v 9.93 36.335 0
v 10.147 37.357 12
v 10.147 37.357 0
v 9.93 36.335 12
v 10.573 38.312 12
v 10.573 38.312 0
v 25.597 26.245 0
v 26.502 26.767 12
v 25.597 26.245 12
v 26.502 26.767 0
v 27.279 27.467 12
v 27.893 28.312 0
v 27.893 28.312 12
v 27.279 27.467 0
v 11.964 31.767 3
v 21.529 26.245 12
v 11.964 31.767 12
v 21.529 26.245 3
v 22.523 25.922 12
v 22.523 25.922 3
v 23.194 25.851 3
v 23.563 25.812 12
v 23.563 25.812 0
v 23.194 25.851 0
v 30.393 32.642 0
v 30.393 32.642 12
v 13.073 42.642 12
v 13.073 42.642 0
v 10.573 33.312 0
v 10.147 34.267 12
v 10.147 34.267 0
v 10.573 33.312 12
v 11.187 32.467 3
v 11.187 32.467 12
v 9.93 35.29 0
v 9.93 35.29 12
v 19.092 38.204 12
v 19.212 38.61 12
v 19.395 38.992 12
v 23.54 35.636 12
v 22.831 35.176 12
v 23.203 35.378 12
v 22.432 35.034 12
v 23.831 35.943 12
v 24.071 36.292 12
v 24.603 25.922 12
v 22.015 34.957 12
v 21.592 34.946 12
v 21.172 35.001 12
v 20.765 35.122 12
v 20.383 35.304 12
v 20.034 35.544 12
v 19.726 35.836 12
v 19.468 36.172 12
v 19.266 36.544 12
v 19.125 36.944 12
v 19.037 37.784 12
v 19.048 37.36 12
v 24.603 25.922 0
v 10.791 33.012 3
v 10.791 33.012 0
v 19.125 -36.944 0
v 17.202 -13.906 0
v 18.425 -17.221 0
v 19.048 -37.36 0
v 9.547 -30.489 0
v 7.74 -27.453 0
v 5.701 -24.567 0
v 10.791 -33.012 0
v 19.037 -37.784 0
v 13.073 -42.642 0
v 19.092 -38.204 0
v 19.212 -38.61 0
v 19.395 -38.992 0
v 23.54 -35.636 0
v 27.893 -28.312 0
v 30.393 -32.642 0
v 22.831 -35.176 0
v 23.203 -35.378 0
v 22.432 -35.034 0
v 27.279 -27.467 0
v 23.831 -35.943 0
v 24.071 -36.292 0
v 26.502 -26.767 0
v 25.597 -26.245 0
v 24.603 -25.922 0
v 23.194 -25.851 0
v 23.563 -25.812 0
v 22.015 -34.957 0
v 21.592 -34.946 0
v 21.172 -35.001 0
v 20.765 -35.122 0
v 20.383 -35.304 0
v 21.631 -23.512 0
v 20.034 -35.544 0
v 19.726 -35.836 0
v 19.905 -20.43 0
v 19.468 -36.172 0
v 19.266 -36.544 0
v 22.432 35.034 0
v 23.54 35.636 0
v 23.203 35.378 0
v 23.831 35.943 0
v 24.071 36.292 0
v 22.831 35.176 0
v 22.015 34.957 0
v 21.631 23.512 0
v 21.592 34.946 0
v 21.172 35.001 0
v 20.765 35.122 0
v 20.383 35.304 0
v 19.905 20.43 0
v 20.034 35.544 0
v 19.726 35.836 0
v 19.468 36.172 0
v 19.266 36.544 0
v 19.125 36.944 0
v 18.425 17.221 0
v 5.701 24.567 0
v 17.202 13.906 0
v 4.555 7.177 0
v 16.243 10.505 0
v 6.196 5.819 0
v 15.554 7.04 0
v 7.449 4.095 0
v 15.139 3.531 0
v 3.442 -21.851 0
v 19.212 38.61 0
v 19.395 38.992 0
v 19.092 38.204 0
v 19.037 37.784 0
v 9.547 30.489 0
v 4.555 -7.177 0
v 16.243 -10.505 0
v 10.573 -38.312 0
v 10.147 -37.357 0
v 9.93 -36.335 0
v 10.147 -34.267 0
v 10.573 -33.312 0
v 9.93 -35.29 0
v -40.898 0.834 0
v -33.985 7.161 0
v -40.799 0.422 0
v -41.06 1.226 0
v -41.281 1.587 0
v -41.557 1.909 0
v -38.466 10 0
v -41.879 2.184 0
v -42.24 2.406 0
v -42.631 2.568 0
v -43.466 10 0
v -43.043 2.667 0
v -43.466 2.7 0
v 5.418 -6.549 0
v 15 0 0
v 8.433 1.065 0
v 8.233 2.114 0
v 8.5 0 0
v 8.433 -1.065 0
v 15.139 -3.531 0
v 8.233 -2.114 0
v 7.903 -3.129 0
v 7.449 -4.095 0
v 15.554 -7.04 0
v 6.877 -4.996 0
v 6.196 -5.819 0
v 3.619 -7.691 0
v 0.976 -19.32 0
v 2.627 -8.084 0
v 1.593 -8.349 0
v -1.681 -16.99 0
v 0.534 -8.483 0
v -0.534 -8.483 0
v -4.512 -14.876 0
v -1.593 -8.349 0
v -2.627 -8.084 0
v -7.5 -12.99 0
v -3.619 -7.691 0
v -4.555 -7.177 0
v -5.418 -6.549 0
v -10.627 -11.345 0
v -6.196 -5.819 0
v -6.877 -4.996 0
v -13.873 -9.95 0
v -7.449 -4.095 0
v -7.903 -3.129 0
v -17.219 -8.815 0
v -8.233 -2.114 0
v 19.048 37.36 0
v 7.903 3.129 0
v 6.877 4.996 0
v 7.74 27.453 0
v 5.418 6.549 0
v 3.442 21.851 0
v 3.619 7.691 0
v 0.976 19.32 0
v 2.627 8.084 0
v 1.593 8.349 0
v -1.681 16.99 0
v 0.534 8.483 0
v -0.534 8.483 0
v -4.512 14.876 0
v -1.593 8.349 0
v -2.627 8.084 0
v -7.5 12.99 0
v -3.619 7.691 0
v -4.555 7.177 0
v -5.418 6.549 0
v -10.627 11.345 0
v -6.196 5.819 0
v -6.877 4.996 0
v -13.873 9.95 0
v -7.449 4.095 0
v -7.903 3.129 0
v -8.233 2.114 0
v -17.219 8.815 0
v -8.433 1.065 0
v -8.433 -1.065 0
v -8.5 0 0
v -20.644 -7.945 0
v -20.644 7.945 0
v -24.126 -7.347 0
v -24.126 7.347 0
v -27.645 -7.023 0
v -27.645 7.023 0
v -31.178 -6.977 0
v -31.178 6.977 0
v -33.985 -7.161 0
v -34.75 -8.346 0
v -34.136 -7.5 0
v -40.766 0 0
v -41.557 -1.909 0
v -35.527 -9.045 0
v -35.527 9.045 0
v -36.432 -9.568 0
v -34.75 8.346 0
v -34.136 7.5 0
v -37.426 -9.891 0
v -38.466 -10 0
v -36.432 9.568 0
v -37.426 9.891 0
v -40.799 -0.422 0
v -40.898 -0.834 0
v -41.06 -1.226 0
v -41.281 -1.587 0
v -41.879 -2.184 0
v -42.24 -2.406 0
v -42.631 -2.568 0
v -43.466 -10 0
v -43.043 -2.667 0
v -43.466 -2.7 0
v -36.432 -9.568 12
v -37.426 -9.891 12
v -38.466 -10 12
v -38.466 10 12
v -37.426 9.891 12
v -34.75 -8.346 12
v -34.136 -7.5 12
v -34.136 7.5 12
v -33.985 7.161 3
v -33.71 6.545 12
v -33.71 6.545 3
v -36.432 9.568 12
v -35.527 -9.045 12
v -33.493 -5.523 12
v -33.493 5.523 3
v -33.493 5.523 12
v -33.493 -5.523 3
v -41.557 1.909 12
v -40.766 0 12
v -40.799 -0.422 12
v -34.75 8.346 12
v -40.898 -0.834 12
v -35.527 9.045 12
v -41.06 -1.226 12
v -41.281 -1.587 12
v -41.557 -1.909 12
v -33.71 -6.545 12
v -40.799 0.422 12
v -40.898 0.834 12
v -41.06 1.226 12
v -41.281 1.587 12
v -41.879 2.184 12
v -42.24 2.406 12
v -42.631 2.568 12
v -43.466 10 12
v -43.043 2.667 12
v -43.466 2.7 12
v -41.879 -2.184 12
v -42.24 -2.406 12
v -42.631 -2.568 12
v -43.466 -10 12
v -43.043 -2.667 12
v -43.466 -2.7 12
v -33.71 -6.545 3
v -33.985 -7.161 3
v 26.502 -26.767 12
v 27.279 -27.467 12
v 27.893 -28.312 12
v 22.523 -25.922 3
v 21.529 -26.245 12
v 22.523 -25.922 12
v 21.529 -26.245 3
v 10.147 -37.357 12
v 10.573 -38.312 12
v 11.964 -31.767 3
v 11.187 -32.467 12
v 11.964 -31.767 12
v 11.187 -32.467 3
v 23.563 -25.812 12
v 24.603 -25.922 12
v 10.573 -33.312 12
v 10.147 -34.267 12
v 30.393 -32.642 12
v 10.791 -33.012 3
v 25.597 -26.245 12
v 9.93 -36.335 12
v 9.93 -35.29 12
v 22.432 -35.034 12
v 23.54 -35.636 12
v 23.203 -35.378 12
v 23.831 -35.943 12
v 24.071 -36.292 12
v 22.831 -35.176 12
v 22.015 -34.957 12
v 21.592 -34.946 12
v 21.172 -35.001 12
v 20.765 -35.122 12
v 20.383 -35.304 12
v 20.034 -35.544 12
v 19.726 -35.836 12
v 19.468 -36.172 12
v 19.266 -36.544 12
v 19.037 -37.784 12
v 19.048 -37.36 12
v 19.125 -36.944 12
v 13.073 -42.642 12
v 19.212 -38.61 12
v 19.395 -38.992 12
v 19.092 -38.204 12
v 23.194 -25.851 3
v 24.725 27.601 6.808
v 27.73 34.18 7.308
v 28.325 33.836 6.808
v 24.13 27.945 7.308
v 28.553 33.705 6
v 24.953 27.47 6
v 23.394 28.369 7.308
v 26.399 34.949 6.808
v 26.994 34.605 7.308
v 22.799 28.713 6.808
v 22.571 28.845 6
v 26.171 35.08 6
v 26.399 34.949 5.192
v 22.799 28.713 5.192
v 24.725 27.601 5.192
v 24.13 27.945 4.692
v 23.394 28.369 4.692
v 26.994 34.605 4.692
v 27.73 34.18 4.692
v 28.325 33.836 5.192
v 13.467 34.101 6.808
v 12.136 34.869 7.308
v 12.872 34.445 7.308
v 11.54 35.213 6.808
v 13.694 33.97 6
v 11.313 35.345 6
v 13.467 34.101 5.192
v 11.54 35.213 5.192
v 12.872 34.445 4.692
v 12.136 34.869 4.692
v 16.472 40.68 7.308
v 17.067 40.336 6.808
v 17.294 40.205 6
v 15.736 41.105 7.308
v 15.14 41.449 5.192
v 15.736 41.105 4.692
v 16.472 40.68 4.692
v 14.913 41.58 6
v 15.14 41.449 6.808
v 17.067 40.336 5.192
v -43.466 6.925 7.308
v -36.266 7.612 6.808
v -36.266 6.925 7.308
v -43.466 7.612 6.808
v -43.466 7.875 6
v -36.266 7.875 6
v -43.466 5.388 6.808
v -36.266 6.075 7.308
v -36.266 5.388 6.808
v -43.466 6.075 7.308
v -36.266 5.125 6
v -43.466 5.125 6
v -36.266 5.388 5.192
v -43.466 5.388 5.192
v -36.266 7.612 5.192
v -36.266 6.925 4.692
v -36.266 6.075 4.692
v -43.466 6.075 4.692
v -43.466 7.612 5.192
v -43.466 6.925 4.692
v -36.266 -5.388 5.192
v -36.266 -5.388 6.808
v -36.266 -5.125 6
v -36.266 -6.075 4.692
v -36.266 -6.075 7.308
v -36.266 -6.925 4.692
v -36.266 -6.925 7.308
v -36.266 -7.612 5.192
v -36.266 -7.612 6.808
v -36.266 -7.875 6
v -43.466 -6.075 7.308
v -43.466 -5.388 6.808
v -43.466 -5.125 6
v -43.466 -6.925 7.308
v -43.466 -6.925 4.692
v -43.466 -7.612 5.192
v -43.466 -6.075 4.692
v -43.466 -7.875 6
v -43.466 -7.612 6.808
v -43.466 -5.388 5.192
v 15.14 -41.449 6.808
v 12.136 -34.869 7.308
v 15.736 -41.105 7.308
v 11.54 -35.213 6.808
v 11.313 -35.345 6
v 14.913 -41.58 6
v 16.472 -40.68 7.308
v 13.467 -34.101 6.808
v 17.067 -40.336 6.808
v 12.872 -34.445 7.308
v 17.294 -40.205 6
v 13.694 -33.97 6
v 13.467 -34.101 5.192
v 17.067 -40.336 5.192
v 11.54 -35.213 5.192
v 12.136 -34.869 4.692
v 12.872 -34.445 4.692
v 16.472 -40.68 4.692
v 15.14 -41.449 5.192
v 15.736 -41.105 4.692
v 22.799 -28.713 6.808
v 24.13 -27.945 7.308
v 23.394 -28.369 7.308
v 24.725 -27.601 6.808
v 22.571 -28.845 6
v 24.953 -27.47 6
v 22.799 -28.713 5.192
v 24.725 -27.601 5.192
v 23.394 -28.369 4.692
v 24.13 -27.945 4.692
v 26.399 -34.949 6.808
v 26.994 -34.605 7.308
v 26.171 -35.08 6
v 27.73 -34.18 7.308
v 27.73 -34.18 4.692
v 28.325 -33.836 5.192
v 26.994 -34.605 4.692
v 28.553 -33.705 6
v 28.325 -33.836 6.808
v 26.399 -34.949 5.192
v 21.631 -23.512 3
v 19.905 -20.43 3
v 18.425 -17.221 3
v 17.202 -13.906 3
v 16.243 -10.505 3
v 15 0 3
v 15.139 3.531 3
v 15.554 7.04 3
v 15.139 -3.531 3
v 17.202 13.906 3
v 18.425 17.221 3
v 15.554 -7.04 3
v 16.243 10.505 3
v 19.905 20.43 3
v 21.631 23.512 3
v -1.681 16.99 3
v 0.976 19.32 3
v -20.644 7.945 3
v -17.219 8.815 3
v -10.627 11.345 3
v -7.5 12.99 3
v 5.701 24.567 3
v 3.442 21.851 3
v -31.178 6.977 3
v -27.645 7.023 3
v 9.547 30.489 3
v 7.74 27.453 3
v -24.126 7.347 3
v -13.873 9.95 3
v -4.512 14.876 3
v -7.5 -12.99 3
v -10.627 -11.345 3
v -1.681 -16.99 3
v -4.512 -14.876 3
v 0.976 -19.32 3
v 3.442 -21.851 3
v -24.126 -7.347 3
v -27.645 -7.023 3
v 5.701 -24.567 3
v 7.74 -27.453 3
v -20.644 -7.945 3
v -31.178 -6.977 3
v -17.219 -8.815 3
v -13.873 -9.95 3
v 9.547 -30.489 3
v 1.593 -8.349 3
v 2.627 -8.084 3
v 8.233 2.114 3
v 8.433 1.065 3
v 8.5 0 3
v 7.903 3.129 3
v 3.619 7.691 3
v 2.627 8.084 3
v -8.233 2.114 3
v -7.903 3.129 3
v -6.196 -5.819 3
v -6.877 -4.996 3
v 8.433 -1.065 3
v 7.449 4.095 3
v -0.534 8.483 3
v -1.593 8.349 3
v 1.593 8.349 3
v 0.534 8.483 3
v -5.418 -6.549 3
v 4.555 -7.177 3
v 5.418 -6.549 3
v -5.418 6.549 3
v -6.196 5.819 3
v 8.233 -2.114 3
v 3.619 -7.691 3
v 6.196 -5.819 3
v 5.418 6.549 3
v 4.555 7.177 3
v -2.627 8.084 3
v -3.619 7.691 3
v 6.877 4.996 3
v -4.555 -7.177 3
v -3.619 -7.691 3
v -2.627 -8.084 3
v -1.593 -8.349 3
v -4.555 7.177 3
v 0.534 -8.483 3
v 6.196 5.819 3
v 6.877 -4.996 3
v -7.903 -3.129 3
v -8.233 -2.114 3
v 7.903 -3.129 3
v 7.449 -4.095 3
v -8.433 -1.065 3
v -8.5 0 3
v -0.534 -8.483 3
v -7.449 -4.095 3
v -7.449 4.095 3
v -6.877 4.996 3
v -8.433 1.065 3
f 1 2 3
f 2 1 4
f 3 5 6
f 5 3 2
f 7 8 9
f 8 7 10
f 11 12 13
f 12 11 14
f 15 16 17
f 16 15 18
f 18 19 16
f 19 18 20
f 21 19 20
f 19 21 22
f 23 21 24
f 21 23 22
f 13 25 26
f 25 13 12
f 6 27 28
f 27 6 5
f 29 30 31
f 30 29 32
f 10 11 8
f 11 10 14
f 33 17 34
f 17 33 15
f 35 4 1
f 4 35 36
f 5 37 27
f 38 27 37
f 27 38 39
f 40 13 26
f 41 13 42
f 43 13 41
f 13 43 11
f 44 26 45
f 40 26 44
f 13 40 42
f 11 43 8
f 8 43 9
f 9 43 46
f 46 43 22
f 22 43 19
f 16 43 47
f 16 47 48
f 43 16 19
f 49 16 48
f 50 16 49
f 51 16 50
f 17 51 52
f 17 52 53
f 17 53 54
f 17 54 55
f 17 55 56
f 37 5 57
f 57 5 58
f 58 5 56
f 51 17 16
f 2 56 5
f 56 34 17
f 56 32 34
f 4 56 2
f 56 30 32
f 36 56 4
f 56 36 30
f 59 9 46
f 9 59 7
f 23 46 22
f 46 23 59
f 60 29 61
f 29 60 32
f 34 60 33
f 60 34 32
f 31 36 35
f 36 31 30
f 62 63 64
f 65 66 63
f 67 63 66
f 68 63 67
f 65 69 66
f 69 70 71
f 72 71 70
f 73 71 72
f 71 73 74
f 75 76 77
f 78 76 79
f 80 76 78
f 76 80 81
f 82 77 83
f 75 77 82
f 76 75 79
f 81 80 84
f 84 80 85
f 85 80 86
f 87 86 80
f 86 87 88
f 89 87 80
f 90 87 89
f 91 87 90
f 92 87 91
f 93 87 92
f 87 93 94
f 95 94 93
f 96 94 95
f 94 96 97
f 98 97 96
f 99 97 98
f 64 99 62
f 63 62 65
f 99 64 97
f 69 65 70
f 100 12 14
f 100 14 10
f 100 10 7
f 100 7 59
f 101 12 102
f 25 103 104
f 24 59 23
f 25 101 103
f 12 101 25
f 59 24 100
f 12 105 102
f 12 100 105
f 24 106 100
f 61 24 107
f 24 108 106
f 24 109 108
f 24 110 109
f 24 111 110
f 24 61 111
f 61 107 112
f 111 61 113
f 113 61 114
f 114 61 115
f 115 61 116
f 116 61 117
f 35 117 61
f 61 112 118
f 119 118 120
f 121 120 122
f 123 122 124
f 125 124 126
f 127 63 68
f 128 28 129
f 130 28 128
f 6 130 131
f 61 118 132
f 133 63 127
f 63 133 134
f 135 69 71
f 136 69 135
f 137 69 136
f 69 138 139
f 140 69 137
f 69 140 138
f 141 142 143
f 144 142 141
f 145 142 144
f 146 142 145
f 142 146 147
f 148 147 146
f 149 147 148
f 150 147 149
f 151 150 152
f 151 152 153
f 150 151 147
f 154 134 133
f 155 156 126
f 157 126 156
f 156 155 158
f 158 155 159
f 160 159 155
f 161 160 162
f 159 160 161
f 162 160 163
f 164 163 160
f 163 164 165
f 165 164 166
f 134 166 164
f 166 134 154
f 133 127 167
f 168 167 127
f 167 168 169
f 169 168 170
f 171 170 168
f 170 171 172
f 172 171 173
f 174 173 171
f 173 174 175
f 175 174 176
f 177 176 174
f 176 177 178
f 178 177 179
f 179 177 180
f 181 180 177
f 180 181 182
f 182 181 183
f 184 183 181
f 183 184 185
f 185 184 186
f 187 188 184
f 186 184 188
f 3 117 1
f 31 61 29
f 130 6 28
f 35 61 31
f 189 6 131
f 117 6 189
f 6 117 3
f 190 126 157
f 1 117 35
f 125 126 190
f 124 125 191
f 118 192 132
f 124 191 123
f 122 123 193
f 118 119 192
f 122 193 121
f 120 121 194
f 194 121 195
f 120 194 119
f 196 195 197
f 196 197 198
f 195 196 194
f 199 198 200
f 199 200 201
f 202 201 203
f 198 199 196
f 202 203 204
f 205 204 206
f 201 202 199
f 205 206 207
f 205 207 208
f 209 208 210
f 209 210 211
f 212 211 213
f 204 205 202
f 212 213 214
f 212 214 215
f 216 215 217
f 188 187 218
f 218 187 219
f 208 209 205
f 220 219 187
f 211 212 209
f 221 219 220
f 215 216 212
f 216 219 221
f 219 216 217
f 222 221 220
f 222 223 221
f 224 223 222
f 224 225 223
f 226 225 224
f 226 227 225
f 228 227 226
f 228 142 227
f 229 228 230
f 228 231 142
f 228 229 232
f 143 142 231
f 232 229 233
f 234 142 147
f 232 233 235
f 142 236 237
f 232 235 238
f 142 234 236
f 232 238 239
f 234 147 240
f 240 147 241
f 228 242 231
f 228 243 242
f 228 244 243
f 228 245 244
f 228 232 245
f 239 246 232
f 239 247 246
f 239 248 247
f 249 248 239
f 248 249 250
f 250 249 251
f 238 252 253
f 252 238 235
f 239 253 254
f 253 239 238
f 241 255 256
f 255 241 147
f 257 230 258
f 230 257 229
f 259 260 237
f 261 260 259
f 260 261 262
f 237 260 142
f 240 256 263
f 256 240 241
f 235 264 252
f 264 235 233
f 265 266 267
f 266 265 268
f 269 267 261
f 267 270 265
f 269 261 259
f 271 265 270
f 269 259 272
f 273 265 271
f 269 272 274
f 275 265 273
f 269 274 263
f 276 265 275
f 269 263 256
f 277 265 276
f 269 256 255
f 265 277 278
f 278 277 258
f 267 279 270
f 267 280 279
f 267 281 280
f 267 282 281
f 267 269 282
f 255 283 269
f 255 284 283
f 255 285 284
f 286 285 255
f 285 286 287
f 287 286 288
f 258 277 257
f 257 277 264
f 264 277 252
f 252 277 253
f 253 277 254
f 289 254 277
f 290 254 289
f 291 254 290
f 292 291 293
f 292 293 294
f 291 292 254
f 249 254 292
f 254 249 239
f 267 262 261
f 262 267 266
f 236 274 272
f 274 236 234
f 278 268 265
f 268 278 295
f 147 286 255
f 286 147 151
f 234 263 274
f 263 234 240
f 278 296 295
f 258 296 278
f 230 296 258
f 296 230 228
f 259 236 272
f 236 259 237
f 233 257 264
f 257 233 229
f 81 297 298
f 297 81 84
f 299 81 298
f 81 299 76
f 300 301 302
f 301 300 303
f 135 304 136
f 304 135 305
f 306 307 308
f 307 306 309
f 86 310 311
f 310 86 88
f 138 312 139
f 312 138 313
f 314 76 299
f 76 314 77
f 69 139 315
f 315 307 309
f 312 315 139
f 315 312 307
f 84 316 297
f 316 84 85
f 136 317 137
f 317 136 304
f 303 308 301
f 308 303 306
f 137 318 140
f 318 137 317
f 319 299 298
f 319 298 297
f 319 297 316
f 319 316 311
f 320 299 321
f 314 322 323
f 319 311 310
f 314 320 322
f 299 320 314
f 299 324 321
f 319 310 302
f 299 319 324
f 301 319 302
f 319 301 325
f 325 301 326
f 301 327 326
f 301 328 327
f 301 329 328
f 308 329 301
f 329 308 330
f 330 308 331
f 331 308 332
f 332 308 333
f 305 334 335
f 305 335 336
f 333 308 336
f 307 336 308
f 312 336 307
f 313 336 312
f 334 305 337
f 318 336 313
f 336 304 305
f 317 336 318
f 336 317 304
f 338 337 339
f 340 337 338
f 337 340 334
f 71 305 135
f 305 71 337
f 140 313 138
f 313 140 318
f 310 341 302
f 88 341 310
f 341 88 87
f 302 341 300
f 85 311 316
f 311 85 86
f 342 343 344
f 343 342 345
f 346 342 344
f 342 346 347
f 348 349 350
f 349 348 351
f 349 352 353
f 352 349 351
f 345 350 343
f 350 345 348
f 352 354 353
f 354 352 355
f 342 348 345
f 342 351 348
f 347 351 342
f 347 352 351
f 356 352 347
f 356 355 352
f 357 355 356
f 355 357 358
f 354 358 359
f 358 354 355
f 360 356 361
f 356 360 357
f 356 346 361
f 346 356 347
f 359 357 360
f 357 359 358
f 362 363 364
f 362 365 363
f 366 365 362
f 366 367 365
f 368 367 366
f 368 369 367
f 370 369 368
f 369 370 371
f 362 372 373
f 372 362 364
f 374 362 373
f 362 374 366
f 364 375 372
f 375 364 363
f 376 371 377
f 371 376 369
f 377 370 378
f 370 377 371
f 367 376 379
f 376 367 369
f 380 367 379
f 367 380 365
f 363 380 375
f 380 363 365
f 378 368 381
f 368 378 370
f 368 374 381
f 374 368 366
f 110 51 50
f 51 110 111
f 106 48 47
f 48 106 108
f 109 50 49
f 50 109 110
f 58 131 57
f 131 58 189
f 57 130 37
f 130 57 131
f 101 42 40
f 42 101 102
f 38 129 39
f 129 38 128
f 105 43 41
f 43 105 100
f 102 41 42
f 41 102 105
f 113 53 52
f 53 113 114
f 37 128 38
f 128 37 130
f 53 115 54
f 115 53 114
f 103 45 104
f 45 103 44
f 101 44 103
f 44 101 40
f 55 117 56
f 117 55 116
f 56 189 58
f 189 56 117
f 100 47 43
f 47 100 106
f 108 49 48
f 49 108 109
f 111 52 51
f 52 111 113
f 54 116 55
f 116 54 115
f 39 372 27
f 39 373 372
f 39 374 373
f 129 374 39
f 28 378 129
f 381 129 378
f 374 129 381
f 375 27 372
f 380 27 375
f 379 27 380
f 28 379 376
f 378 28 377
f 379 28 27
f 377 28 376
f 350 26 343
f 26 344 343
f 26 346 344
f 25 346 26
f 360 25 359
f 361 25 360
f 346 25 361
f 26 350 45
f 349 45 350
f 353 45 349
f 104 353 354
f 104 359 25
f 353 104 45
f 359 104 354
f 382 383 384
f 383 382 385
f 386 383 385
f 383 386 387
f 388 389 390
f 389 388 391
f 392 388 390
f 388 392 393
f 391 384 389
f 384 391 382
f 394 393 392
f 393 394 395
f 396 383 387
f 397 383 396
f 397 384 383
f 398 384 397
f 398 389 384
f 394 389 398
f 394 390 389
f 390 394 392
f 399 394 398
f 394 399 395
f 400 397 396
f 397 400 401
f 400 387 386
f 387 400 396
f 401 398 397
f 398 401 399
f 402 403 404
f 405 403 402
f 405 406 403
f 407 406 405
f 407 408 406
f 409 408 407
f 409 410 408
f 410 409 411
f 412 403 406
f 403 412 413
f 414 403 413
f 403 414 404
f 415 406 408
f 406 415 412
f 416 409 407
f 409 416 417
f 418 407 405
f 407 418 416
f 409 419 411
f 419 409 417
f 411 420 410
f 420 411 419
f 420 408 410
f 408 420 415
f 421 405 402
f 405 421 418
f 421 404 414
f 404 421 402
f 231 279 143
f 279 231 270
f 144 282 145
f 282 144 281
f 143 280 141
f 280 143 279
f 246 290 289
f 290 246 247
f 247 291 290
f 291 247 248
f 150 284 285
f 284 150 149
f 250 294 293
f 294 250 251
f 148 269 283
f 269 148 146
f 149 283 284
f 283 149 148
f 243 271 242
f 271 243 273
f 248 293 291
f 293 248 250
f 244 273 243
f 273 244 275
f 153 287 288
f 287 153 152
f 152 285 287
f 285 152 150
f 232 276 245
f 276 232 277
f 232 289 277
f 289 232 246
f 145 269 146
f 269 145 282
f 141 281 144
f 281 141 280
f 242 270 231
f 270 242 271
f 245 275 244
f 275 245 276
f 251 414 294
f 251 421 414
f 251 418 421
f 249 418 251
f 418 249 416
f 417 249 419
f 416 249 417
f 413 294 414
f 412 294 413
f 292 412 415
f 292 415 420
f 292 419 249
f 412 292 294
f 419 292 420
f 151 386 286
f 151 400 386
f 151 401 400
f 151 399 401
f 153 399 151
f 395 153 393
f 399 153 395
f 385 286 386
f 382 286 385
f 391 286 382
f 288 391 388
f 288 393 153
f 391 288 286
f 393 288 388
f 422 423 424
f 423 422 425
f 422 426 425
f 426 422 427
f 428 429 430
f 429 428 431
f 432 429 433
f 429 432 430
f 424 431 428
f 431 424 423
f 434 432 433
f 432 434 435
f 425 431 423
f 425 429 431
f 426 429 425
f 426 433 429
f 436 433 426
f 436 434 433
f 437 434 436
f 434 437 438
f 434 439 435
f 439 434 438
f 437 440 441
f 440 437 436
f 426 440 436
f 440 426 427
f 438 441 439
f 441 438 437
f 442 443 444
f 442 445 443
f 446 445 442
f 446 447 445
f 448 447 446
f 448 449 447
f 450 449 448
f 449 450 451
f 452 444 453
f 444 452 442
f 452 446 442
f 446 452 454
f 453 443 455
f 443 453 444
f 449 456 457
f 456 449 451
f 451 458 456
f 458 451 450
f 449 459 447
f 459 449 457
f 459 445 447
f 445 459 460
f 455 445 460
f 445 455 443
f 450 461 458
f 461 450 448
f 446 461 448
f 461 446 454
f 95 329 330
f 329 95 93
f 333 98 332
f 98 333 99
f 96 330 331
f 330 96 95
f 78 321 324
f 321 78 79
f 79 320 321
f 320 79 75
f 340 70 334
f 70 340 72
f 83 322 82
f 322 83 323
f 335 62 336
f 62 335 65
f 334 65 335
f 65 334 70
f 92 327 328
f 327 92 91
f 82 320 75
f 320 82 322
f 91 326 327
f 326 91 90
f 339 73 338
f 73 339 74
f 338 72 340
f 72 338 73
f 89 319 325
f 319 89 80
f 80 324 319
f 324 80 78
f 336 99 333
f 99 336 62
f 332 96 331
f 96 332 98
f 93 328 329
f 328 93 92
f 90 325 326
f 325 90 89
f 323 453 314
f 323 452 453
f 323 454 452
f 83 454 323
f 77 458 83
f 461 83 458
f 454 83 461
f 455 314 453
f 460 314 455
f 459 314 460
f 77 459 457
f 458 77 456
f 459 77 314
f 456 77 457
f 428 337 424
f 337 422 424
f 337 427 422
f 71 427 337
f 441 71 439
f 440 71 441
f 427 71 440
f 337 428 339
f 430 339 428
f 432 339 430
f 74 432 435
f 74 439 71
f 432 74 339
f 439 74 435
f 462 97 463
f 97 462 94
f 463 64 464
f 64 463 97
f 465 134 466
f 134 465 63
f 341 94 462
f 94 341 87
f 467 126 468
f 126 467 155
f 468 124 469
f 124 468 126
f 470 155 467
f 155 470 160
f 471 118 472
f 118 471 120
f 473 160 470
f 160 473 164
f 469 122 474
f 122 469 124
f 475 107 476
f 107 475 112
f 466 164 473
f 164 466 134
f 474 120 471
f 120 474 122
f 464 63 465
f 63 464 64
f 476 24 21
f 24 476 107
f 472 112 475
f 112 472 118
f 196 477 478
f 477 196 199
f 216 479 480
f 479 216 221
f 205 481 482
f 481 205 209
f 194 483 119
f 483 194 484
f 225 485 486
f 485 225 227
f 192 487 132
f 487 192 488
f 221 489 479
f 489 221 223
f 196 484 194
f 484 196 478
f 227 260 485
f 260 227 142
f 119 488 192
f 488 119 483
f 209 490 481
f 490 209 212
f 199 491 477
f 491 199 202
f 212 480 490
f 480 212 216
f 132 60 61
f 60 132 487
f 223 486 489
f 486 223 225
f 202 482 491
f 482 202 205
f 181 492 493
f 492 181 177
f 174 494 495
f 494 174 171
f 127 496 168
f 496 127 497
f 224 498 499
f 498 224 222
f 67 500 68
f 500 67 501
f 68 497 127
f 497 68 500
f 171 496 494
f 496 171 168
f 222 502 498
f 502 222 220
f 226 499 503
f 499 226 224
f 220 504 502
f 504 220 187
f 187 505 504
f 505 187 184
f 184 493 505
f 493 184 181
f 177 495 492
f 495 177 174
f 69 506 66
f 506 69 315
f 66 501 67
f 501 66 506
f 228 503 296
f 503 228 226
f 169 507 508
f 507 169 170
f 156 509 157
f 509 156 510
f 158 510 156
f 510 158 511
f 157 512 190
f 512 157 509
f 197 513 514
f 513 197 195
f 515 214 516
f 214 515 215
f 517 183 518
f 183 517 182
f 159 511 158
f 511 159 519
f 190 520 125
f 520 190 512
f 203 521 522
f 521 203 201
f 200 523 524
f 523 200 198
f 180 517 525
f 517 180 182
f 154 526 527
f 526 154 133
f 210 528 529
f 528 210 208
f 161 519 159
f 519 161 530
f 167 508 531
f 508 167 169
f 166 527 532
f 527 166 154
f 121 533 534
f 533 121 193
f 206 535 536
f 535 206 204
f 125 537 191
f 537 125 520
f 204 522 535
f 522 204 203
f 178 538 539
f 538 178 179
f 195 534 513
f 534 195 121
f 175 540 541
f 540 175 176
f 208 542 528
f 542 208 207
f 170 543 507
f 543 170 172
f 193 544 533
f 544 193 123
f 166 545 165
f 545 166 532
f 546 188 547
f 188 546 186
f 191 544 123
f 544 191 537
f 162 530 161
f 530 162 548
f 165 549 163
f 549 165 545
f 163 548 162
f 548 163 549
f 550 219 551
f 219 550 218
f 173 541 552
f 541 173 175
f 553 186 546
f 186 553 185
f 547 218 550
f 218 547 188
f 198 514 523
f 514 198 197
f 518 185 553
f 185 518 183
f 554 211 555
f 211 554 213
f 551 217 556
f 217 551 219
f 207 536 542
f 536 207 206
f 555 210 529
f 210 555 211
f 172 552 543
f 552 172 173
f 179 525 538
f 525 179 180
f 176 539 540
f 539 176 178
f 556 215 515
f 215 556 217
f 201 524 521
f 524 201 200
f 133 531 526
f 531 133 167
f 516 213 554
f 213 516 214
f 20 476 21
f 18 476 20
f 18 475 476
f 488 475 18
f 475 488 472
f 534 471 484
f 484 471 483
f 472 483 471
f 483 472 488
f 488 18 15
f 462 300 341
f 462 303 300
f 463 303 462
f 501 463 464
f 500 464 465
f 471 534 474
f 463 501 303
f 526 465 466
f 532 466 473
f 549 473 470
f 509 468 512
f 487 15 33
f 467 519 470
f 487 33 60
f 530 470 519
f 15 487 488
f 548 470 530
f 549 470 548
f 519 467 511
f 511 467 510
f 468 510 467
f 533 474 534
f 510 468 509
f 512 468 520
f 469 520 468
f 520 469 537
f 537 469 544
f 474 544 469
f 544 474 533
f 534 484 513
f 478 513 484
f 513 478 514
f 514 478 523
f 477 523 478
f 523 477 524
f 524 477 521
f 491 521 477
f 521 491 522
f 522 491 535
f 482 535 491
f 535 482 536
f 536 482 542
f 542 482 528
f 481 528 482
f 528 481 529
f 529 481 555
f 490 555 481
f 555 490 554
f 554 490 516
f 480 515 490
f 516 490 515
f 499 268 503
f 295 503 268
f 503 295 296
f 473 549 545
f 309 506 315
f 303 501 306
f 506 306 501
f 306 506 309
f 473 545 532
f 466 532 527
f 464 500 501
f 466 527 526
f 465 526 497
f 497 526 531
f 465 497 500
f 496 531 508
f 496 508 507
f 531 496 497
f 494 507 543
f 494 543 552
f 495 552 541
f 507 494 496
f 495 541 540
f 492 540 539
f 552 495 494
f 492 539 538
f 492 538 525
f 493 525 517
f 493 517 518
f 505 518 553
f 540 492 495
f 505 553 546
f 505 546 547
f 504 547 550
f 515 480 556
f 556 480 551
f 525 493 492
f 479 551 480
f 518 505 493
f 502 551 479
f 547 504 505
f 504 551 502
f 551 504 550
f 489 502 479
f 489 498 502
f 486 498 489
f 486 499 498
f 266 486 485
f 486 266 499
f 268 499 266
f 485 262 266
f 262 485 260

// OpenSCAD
// file: lib/stepper.scad
smWidth = 42;
smLength = 40;
smScrewHoleOffsets = 31/2;
smCenterDiameter = 22;
smExtra = 1;

module stepperMotor() {
    smCenterHeight = 2;
    smShaftDiameter = 5;
    smShaftLength = 23;
    smScrewDepth = 4.5;
    smScrewDiameter = 3;
    smEdgeTrimOffset = 27;
    module add() {
        translate([-smWidth/2, -smLength, -smWidth/2]) {
            cube([smWidth, smLength, smWidth]);
        }
        rotate([-90, 0, 0]) {
            cylinder(d=smCenterDiameter, h=smCenterHeight, $fn=30);
            cylinder(d=smShaftDiameter, h=smShaftLength, $fn=20);
        }
    }
    module del() {
        for (x = [smScrewHoleOffsets, -smScrewHoleOffsets]) {
            for (z = [smScrewHoleOffsets, -smScrewHoleOffsets]) {
                translate([x, iota, z]) {
                    rotate([90, 0, 0]) {
                        cylinder(d=smScrewDiameter, h=smScrewDepth, $fn=40);
                    }
                }
            }
        }
        for (a = [45, 135, 225, 315]) {
            rotate([0, a, 0]) {
                translate([smEdgeTrimOffset,
                        -smLength-iota, -smWidth/2-iota]) {
                    cube([smWidth, smLength+2*iota, smWidth+2*iota]);
                }
            }
        }

    }
    difference() {
        add();
        del();
    }
}

module stepperMotorHole() {
    smHoleHeight = 20;
    smScrewHoleDiameter = 4;

    widthPlusExtra = smWidth + smExtra;
    lengthPlusExtra = smLength + smExtra/2;

    translate([-smWidth/2, -lengthPlusExtra, -widthPlusExtra/2]) {
        cube([smWidth, lengthPlusExtra, widthPlusExtra]);
    }
    translate([0, -iota, 0]) {
        rotate([-90, 0, 0]) {
            cylinder(d=smCenterDiameter+smExtra, h=smHoleHeight, $fn=40);
        }
    }
    for (x = [smScrewHoleOffsets, -smScrewHoleOffsets]) {
        for (z = [smScrewHoleOffsets, -smScrewHoleOffsets]) {
            translate([x, smHoleHeight-iota, z]) {
                rotate([90, 0, 0]) {
                    cylinder(d=smScrewHoleDiameter, h=smHoleHeight, $fn=40);
                }
            }
        }
    }

}
// file: lib/commonConstants.scad
// A small quantity to keep parts from starting or ending at exactly the
// same location. For example when we create a hole through an object we
// want the object being subtracted to stick slightly past the object being
// subtracted from.
iota = 0.1;


// Length and hole diameter of the #4 x 3/8in Phillips mount screw.
screwLength = 9.3;
screwHoleDiameter = 2.75;
screwHeadDiameter = 6.5;
screwBodyDiameter = 3.4;


// These constants are the basic parameters of the mount plate. They are
// necessary for other components to make their calculations.
mountPlateWidth = 37.6;
mountPlateLength = 51;


// These constants are the basis for the carbon fiber mount points. They are
// necessary for other components to make their calculations.
mountRodDiameter = 5.5;         // A little extra because holes are smaller.
mountThickness = 9;
mountDiameter = mountRodDiameter + 2*mountThickness;


// These constasnts are teh basis for the motor base. They are necessary for
// other components to make their calculations.
motorBaseExtraAxisOffset = 5;
motorBaseTopOffset = sqrt(3)*mountPlateWidth/6 + motorBaseExtraAxisOffset;
motorBaseBottomOffset = mountPlateLength/sqrt(2) + motorBaseTopOffset;
motorBaseBottomRadius = sqrt(pow(motorBaseBottomOffset,2) +
                             pow(mountPlateWidth/2, 2));
mountBaseRodOffsets = motorBaseBottomRadius-mountDiameter/2;
// main file
include <lib/commonConstants.scad>;
include <lib/stepper.scad>;
include <lib/commonMounts.scad>;

interiorMount();
